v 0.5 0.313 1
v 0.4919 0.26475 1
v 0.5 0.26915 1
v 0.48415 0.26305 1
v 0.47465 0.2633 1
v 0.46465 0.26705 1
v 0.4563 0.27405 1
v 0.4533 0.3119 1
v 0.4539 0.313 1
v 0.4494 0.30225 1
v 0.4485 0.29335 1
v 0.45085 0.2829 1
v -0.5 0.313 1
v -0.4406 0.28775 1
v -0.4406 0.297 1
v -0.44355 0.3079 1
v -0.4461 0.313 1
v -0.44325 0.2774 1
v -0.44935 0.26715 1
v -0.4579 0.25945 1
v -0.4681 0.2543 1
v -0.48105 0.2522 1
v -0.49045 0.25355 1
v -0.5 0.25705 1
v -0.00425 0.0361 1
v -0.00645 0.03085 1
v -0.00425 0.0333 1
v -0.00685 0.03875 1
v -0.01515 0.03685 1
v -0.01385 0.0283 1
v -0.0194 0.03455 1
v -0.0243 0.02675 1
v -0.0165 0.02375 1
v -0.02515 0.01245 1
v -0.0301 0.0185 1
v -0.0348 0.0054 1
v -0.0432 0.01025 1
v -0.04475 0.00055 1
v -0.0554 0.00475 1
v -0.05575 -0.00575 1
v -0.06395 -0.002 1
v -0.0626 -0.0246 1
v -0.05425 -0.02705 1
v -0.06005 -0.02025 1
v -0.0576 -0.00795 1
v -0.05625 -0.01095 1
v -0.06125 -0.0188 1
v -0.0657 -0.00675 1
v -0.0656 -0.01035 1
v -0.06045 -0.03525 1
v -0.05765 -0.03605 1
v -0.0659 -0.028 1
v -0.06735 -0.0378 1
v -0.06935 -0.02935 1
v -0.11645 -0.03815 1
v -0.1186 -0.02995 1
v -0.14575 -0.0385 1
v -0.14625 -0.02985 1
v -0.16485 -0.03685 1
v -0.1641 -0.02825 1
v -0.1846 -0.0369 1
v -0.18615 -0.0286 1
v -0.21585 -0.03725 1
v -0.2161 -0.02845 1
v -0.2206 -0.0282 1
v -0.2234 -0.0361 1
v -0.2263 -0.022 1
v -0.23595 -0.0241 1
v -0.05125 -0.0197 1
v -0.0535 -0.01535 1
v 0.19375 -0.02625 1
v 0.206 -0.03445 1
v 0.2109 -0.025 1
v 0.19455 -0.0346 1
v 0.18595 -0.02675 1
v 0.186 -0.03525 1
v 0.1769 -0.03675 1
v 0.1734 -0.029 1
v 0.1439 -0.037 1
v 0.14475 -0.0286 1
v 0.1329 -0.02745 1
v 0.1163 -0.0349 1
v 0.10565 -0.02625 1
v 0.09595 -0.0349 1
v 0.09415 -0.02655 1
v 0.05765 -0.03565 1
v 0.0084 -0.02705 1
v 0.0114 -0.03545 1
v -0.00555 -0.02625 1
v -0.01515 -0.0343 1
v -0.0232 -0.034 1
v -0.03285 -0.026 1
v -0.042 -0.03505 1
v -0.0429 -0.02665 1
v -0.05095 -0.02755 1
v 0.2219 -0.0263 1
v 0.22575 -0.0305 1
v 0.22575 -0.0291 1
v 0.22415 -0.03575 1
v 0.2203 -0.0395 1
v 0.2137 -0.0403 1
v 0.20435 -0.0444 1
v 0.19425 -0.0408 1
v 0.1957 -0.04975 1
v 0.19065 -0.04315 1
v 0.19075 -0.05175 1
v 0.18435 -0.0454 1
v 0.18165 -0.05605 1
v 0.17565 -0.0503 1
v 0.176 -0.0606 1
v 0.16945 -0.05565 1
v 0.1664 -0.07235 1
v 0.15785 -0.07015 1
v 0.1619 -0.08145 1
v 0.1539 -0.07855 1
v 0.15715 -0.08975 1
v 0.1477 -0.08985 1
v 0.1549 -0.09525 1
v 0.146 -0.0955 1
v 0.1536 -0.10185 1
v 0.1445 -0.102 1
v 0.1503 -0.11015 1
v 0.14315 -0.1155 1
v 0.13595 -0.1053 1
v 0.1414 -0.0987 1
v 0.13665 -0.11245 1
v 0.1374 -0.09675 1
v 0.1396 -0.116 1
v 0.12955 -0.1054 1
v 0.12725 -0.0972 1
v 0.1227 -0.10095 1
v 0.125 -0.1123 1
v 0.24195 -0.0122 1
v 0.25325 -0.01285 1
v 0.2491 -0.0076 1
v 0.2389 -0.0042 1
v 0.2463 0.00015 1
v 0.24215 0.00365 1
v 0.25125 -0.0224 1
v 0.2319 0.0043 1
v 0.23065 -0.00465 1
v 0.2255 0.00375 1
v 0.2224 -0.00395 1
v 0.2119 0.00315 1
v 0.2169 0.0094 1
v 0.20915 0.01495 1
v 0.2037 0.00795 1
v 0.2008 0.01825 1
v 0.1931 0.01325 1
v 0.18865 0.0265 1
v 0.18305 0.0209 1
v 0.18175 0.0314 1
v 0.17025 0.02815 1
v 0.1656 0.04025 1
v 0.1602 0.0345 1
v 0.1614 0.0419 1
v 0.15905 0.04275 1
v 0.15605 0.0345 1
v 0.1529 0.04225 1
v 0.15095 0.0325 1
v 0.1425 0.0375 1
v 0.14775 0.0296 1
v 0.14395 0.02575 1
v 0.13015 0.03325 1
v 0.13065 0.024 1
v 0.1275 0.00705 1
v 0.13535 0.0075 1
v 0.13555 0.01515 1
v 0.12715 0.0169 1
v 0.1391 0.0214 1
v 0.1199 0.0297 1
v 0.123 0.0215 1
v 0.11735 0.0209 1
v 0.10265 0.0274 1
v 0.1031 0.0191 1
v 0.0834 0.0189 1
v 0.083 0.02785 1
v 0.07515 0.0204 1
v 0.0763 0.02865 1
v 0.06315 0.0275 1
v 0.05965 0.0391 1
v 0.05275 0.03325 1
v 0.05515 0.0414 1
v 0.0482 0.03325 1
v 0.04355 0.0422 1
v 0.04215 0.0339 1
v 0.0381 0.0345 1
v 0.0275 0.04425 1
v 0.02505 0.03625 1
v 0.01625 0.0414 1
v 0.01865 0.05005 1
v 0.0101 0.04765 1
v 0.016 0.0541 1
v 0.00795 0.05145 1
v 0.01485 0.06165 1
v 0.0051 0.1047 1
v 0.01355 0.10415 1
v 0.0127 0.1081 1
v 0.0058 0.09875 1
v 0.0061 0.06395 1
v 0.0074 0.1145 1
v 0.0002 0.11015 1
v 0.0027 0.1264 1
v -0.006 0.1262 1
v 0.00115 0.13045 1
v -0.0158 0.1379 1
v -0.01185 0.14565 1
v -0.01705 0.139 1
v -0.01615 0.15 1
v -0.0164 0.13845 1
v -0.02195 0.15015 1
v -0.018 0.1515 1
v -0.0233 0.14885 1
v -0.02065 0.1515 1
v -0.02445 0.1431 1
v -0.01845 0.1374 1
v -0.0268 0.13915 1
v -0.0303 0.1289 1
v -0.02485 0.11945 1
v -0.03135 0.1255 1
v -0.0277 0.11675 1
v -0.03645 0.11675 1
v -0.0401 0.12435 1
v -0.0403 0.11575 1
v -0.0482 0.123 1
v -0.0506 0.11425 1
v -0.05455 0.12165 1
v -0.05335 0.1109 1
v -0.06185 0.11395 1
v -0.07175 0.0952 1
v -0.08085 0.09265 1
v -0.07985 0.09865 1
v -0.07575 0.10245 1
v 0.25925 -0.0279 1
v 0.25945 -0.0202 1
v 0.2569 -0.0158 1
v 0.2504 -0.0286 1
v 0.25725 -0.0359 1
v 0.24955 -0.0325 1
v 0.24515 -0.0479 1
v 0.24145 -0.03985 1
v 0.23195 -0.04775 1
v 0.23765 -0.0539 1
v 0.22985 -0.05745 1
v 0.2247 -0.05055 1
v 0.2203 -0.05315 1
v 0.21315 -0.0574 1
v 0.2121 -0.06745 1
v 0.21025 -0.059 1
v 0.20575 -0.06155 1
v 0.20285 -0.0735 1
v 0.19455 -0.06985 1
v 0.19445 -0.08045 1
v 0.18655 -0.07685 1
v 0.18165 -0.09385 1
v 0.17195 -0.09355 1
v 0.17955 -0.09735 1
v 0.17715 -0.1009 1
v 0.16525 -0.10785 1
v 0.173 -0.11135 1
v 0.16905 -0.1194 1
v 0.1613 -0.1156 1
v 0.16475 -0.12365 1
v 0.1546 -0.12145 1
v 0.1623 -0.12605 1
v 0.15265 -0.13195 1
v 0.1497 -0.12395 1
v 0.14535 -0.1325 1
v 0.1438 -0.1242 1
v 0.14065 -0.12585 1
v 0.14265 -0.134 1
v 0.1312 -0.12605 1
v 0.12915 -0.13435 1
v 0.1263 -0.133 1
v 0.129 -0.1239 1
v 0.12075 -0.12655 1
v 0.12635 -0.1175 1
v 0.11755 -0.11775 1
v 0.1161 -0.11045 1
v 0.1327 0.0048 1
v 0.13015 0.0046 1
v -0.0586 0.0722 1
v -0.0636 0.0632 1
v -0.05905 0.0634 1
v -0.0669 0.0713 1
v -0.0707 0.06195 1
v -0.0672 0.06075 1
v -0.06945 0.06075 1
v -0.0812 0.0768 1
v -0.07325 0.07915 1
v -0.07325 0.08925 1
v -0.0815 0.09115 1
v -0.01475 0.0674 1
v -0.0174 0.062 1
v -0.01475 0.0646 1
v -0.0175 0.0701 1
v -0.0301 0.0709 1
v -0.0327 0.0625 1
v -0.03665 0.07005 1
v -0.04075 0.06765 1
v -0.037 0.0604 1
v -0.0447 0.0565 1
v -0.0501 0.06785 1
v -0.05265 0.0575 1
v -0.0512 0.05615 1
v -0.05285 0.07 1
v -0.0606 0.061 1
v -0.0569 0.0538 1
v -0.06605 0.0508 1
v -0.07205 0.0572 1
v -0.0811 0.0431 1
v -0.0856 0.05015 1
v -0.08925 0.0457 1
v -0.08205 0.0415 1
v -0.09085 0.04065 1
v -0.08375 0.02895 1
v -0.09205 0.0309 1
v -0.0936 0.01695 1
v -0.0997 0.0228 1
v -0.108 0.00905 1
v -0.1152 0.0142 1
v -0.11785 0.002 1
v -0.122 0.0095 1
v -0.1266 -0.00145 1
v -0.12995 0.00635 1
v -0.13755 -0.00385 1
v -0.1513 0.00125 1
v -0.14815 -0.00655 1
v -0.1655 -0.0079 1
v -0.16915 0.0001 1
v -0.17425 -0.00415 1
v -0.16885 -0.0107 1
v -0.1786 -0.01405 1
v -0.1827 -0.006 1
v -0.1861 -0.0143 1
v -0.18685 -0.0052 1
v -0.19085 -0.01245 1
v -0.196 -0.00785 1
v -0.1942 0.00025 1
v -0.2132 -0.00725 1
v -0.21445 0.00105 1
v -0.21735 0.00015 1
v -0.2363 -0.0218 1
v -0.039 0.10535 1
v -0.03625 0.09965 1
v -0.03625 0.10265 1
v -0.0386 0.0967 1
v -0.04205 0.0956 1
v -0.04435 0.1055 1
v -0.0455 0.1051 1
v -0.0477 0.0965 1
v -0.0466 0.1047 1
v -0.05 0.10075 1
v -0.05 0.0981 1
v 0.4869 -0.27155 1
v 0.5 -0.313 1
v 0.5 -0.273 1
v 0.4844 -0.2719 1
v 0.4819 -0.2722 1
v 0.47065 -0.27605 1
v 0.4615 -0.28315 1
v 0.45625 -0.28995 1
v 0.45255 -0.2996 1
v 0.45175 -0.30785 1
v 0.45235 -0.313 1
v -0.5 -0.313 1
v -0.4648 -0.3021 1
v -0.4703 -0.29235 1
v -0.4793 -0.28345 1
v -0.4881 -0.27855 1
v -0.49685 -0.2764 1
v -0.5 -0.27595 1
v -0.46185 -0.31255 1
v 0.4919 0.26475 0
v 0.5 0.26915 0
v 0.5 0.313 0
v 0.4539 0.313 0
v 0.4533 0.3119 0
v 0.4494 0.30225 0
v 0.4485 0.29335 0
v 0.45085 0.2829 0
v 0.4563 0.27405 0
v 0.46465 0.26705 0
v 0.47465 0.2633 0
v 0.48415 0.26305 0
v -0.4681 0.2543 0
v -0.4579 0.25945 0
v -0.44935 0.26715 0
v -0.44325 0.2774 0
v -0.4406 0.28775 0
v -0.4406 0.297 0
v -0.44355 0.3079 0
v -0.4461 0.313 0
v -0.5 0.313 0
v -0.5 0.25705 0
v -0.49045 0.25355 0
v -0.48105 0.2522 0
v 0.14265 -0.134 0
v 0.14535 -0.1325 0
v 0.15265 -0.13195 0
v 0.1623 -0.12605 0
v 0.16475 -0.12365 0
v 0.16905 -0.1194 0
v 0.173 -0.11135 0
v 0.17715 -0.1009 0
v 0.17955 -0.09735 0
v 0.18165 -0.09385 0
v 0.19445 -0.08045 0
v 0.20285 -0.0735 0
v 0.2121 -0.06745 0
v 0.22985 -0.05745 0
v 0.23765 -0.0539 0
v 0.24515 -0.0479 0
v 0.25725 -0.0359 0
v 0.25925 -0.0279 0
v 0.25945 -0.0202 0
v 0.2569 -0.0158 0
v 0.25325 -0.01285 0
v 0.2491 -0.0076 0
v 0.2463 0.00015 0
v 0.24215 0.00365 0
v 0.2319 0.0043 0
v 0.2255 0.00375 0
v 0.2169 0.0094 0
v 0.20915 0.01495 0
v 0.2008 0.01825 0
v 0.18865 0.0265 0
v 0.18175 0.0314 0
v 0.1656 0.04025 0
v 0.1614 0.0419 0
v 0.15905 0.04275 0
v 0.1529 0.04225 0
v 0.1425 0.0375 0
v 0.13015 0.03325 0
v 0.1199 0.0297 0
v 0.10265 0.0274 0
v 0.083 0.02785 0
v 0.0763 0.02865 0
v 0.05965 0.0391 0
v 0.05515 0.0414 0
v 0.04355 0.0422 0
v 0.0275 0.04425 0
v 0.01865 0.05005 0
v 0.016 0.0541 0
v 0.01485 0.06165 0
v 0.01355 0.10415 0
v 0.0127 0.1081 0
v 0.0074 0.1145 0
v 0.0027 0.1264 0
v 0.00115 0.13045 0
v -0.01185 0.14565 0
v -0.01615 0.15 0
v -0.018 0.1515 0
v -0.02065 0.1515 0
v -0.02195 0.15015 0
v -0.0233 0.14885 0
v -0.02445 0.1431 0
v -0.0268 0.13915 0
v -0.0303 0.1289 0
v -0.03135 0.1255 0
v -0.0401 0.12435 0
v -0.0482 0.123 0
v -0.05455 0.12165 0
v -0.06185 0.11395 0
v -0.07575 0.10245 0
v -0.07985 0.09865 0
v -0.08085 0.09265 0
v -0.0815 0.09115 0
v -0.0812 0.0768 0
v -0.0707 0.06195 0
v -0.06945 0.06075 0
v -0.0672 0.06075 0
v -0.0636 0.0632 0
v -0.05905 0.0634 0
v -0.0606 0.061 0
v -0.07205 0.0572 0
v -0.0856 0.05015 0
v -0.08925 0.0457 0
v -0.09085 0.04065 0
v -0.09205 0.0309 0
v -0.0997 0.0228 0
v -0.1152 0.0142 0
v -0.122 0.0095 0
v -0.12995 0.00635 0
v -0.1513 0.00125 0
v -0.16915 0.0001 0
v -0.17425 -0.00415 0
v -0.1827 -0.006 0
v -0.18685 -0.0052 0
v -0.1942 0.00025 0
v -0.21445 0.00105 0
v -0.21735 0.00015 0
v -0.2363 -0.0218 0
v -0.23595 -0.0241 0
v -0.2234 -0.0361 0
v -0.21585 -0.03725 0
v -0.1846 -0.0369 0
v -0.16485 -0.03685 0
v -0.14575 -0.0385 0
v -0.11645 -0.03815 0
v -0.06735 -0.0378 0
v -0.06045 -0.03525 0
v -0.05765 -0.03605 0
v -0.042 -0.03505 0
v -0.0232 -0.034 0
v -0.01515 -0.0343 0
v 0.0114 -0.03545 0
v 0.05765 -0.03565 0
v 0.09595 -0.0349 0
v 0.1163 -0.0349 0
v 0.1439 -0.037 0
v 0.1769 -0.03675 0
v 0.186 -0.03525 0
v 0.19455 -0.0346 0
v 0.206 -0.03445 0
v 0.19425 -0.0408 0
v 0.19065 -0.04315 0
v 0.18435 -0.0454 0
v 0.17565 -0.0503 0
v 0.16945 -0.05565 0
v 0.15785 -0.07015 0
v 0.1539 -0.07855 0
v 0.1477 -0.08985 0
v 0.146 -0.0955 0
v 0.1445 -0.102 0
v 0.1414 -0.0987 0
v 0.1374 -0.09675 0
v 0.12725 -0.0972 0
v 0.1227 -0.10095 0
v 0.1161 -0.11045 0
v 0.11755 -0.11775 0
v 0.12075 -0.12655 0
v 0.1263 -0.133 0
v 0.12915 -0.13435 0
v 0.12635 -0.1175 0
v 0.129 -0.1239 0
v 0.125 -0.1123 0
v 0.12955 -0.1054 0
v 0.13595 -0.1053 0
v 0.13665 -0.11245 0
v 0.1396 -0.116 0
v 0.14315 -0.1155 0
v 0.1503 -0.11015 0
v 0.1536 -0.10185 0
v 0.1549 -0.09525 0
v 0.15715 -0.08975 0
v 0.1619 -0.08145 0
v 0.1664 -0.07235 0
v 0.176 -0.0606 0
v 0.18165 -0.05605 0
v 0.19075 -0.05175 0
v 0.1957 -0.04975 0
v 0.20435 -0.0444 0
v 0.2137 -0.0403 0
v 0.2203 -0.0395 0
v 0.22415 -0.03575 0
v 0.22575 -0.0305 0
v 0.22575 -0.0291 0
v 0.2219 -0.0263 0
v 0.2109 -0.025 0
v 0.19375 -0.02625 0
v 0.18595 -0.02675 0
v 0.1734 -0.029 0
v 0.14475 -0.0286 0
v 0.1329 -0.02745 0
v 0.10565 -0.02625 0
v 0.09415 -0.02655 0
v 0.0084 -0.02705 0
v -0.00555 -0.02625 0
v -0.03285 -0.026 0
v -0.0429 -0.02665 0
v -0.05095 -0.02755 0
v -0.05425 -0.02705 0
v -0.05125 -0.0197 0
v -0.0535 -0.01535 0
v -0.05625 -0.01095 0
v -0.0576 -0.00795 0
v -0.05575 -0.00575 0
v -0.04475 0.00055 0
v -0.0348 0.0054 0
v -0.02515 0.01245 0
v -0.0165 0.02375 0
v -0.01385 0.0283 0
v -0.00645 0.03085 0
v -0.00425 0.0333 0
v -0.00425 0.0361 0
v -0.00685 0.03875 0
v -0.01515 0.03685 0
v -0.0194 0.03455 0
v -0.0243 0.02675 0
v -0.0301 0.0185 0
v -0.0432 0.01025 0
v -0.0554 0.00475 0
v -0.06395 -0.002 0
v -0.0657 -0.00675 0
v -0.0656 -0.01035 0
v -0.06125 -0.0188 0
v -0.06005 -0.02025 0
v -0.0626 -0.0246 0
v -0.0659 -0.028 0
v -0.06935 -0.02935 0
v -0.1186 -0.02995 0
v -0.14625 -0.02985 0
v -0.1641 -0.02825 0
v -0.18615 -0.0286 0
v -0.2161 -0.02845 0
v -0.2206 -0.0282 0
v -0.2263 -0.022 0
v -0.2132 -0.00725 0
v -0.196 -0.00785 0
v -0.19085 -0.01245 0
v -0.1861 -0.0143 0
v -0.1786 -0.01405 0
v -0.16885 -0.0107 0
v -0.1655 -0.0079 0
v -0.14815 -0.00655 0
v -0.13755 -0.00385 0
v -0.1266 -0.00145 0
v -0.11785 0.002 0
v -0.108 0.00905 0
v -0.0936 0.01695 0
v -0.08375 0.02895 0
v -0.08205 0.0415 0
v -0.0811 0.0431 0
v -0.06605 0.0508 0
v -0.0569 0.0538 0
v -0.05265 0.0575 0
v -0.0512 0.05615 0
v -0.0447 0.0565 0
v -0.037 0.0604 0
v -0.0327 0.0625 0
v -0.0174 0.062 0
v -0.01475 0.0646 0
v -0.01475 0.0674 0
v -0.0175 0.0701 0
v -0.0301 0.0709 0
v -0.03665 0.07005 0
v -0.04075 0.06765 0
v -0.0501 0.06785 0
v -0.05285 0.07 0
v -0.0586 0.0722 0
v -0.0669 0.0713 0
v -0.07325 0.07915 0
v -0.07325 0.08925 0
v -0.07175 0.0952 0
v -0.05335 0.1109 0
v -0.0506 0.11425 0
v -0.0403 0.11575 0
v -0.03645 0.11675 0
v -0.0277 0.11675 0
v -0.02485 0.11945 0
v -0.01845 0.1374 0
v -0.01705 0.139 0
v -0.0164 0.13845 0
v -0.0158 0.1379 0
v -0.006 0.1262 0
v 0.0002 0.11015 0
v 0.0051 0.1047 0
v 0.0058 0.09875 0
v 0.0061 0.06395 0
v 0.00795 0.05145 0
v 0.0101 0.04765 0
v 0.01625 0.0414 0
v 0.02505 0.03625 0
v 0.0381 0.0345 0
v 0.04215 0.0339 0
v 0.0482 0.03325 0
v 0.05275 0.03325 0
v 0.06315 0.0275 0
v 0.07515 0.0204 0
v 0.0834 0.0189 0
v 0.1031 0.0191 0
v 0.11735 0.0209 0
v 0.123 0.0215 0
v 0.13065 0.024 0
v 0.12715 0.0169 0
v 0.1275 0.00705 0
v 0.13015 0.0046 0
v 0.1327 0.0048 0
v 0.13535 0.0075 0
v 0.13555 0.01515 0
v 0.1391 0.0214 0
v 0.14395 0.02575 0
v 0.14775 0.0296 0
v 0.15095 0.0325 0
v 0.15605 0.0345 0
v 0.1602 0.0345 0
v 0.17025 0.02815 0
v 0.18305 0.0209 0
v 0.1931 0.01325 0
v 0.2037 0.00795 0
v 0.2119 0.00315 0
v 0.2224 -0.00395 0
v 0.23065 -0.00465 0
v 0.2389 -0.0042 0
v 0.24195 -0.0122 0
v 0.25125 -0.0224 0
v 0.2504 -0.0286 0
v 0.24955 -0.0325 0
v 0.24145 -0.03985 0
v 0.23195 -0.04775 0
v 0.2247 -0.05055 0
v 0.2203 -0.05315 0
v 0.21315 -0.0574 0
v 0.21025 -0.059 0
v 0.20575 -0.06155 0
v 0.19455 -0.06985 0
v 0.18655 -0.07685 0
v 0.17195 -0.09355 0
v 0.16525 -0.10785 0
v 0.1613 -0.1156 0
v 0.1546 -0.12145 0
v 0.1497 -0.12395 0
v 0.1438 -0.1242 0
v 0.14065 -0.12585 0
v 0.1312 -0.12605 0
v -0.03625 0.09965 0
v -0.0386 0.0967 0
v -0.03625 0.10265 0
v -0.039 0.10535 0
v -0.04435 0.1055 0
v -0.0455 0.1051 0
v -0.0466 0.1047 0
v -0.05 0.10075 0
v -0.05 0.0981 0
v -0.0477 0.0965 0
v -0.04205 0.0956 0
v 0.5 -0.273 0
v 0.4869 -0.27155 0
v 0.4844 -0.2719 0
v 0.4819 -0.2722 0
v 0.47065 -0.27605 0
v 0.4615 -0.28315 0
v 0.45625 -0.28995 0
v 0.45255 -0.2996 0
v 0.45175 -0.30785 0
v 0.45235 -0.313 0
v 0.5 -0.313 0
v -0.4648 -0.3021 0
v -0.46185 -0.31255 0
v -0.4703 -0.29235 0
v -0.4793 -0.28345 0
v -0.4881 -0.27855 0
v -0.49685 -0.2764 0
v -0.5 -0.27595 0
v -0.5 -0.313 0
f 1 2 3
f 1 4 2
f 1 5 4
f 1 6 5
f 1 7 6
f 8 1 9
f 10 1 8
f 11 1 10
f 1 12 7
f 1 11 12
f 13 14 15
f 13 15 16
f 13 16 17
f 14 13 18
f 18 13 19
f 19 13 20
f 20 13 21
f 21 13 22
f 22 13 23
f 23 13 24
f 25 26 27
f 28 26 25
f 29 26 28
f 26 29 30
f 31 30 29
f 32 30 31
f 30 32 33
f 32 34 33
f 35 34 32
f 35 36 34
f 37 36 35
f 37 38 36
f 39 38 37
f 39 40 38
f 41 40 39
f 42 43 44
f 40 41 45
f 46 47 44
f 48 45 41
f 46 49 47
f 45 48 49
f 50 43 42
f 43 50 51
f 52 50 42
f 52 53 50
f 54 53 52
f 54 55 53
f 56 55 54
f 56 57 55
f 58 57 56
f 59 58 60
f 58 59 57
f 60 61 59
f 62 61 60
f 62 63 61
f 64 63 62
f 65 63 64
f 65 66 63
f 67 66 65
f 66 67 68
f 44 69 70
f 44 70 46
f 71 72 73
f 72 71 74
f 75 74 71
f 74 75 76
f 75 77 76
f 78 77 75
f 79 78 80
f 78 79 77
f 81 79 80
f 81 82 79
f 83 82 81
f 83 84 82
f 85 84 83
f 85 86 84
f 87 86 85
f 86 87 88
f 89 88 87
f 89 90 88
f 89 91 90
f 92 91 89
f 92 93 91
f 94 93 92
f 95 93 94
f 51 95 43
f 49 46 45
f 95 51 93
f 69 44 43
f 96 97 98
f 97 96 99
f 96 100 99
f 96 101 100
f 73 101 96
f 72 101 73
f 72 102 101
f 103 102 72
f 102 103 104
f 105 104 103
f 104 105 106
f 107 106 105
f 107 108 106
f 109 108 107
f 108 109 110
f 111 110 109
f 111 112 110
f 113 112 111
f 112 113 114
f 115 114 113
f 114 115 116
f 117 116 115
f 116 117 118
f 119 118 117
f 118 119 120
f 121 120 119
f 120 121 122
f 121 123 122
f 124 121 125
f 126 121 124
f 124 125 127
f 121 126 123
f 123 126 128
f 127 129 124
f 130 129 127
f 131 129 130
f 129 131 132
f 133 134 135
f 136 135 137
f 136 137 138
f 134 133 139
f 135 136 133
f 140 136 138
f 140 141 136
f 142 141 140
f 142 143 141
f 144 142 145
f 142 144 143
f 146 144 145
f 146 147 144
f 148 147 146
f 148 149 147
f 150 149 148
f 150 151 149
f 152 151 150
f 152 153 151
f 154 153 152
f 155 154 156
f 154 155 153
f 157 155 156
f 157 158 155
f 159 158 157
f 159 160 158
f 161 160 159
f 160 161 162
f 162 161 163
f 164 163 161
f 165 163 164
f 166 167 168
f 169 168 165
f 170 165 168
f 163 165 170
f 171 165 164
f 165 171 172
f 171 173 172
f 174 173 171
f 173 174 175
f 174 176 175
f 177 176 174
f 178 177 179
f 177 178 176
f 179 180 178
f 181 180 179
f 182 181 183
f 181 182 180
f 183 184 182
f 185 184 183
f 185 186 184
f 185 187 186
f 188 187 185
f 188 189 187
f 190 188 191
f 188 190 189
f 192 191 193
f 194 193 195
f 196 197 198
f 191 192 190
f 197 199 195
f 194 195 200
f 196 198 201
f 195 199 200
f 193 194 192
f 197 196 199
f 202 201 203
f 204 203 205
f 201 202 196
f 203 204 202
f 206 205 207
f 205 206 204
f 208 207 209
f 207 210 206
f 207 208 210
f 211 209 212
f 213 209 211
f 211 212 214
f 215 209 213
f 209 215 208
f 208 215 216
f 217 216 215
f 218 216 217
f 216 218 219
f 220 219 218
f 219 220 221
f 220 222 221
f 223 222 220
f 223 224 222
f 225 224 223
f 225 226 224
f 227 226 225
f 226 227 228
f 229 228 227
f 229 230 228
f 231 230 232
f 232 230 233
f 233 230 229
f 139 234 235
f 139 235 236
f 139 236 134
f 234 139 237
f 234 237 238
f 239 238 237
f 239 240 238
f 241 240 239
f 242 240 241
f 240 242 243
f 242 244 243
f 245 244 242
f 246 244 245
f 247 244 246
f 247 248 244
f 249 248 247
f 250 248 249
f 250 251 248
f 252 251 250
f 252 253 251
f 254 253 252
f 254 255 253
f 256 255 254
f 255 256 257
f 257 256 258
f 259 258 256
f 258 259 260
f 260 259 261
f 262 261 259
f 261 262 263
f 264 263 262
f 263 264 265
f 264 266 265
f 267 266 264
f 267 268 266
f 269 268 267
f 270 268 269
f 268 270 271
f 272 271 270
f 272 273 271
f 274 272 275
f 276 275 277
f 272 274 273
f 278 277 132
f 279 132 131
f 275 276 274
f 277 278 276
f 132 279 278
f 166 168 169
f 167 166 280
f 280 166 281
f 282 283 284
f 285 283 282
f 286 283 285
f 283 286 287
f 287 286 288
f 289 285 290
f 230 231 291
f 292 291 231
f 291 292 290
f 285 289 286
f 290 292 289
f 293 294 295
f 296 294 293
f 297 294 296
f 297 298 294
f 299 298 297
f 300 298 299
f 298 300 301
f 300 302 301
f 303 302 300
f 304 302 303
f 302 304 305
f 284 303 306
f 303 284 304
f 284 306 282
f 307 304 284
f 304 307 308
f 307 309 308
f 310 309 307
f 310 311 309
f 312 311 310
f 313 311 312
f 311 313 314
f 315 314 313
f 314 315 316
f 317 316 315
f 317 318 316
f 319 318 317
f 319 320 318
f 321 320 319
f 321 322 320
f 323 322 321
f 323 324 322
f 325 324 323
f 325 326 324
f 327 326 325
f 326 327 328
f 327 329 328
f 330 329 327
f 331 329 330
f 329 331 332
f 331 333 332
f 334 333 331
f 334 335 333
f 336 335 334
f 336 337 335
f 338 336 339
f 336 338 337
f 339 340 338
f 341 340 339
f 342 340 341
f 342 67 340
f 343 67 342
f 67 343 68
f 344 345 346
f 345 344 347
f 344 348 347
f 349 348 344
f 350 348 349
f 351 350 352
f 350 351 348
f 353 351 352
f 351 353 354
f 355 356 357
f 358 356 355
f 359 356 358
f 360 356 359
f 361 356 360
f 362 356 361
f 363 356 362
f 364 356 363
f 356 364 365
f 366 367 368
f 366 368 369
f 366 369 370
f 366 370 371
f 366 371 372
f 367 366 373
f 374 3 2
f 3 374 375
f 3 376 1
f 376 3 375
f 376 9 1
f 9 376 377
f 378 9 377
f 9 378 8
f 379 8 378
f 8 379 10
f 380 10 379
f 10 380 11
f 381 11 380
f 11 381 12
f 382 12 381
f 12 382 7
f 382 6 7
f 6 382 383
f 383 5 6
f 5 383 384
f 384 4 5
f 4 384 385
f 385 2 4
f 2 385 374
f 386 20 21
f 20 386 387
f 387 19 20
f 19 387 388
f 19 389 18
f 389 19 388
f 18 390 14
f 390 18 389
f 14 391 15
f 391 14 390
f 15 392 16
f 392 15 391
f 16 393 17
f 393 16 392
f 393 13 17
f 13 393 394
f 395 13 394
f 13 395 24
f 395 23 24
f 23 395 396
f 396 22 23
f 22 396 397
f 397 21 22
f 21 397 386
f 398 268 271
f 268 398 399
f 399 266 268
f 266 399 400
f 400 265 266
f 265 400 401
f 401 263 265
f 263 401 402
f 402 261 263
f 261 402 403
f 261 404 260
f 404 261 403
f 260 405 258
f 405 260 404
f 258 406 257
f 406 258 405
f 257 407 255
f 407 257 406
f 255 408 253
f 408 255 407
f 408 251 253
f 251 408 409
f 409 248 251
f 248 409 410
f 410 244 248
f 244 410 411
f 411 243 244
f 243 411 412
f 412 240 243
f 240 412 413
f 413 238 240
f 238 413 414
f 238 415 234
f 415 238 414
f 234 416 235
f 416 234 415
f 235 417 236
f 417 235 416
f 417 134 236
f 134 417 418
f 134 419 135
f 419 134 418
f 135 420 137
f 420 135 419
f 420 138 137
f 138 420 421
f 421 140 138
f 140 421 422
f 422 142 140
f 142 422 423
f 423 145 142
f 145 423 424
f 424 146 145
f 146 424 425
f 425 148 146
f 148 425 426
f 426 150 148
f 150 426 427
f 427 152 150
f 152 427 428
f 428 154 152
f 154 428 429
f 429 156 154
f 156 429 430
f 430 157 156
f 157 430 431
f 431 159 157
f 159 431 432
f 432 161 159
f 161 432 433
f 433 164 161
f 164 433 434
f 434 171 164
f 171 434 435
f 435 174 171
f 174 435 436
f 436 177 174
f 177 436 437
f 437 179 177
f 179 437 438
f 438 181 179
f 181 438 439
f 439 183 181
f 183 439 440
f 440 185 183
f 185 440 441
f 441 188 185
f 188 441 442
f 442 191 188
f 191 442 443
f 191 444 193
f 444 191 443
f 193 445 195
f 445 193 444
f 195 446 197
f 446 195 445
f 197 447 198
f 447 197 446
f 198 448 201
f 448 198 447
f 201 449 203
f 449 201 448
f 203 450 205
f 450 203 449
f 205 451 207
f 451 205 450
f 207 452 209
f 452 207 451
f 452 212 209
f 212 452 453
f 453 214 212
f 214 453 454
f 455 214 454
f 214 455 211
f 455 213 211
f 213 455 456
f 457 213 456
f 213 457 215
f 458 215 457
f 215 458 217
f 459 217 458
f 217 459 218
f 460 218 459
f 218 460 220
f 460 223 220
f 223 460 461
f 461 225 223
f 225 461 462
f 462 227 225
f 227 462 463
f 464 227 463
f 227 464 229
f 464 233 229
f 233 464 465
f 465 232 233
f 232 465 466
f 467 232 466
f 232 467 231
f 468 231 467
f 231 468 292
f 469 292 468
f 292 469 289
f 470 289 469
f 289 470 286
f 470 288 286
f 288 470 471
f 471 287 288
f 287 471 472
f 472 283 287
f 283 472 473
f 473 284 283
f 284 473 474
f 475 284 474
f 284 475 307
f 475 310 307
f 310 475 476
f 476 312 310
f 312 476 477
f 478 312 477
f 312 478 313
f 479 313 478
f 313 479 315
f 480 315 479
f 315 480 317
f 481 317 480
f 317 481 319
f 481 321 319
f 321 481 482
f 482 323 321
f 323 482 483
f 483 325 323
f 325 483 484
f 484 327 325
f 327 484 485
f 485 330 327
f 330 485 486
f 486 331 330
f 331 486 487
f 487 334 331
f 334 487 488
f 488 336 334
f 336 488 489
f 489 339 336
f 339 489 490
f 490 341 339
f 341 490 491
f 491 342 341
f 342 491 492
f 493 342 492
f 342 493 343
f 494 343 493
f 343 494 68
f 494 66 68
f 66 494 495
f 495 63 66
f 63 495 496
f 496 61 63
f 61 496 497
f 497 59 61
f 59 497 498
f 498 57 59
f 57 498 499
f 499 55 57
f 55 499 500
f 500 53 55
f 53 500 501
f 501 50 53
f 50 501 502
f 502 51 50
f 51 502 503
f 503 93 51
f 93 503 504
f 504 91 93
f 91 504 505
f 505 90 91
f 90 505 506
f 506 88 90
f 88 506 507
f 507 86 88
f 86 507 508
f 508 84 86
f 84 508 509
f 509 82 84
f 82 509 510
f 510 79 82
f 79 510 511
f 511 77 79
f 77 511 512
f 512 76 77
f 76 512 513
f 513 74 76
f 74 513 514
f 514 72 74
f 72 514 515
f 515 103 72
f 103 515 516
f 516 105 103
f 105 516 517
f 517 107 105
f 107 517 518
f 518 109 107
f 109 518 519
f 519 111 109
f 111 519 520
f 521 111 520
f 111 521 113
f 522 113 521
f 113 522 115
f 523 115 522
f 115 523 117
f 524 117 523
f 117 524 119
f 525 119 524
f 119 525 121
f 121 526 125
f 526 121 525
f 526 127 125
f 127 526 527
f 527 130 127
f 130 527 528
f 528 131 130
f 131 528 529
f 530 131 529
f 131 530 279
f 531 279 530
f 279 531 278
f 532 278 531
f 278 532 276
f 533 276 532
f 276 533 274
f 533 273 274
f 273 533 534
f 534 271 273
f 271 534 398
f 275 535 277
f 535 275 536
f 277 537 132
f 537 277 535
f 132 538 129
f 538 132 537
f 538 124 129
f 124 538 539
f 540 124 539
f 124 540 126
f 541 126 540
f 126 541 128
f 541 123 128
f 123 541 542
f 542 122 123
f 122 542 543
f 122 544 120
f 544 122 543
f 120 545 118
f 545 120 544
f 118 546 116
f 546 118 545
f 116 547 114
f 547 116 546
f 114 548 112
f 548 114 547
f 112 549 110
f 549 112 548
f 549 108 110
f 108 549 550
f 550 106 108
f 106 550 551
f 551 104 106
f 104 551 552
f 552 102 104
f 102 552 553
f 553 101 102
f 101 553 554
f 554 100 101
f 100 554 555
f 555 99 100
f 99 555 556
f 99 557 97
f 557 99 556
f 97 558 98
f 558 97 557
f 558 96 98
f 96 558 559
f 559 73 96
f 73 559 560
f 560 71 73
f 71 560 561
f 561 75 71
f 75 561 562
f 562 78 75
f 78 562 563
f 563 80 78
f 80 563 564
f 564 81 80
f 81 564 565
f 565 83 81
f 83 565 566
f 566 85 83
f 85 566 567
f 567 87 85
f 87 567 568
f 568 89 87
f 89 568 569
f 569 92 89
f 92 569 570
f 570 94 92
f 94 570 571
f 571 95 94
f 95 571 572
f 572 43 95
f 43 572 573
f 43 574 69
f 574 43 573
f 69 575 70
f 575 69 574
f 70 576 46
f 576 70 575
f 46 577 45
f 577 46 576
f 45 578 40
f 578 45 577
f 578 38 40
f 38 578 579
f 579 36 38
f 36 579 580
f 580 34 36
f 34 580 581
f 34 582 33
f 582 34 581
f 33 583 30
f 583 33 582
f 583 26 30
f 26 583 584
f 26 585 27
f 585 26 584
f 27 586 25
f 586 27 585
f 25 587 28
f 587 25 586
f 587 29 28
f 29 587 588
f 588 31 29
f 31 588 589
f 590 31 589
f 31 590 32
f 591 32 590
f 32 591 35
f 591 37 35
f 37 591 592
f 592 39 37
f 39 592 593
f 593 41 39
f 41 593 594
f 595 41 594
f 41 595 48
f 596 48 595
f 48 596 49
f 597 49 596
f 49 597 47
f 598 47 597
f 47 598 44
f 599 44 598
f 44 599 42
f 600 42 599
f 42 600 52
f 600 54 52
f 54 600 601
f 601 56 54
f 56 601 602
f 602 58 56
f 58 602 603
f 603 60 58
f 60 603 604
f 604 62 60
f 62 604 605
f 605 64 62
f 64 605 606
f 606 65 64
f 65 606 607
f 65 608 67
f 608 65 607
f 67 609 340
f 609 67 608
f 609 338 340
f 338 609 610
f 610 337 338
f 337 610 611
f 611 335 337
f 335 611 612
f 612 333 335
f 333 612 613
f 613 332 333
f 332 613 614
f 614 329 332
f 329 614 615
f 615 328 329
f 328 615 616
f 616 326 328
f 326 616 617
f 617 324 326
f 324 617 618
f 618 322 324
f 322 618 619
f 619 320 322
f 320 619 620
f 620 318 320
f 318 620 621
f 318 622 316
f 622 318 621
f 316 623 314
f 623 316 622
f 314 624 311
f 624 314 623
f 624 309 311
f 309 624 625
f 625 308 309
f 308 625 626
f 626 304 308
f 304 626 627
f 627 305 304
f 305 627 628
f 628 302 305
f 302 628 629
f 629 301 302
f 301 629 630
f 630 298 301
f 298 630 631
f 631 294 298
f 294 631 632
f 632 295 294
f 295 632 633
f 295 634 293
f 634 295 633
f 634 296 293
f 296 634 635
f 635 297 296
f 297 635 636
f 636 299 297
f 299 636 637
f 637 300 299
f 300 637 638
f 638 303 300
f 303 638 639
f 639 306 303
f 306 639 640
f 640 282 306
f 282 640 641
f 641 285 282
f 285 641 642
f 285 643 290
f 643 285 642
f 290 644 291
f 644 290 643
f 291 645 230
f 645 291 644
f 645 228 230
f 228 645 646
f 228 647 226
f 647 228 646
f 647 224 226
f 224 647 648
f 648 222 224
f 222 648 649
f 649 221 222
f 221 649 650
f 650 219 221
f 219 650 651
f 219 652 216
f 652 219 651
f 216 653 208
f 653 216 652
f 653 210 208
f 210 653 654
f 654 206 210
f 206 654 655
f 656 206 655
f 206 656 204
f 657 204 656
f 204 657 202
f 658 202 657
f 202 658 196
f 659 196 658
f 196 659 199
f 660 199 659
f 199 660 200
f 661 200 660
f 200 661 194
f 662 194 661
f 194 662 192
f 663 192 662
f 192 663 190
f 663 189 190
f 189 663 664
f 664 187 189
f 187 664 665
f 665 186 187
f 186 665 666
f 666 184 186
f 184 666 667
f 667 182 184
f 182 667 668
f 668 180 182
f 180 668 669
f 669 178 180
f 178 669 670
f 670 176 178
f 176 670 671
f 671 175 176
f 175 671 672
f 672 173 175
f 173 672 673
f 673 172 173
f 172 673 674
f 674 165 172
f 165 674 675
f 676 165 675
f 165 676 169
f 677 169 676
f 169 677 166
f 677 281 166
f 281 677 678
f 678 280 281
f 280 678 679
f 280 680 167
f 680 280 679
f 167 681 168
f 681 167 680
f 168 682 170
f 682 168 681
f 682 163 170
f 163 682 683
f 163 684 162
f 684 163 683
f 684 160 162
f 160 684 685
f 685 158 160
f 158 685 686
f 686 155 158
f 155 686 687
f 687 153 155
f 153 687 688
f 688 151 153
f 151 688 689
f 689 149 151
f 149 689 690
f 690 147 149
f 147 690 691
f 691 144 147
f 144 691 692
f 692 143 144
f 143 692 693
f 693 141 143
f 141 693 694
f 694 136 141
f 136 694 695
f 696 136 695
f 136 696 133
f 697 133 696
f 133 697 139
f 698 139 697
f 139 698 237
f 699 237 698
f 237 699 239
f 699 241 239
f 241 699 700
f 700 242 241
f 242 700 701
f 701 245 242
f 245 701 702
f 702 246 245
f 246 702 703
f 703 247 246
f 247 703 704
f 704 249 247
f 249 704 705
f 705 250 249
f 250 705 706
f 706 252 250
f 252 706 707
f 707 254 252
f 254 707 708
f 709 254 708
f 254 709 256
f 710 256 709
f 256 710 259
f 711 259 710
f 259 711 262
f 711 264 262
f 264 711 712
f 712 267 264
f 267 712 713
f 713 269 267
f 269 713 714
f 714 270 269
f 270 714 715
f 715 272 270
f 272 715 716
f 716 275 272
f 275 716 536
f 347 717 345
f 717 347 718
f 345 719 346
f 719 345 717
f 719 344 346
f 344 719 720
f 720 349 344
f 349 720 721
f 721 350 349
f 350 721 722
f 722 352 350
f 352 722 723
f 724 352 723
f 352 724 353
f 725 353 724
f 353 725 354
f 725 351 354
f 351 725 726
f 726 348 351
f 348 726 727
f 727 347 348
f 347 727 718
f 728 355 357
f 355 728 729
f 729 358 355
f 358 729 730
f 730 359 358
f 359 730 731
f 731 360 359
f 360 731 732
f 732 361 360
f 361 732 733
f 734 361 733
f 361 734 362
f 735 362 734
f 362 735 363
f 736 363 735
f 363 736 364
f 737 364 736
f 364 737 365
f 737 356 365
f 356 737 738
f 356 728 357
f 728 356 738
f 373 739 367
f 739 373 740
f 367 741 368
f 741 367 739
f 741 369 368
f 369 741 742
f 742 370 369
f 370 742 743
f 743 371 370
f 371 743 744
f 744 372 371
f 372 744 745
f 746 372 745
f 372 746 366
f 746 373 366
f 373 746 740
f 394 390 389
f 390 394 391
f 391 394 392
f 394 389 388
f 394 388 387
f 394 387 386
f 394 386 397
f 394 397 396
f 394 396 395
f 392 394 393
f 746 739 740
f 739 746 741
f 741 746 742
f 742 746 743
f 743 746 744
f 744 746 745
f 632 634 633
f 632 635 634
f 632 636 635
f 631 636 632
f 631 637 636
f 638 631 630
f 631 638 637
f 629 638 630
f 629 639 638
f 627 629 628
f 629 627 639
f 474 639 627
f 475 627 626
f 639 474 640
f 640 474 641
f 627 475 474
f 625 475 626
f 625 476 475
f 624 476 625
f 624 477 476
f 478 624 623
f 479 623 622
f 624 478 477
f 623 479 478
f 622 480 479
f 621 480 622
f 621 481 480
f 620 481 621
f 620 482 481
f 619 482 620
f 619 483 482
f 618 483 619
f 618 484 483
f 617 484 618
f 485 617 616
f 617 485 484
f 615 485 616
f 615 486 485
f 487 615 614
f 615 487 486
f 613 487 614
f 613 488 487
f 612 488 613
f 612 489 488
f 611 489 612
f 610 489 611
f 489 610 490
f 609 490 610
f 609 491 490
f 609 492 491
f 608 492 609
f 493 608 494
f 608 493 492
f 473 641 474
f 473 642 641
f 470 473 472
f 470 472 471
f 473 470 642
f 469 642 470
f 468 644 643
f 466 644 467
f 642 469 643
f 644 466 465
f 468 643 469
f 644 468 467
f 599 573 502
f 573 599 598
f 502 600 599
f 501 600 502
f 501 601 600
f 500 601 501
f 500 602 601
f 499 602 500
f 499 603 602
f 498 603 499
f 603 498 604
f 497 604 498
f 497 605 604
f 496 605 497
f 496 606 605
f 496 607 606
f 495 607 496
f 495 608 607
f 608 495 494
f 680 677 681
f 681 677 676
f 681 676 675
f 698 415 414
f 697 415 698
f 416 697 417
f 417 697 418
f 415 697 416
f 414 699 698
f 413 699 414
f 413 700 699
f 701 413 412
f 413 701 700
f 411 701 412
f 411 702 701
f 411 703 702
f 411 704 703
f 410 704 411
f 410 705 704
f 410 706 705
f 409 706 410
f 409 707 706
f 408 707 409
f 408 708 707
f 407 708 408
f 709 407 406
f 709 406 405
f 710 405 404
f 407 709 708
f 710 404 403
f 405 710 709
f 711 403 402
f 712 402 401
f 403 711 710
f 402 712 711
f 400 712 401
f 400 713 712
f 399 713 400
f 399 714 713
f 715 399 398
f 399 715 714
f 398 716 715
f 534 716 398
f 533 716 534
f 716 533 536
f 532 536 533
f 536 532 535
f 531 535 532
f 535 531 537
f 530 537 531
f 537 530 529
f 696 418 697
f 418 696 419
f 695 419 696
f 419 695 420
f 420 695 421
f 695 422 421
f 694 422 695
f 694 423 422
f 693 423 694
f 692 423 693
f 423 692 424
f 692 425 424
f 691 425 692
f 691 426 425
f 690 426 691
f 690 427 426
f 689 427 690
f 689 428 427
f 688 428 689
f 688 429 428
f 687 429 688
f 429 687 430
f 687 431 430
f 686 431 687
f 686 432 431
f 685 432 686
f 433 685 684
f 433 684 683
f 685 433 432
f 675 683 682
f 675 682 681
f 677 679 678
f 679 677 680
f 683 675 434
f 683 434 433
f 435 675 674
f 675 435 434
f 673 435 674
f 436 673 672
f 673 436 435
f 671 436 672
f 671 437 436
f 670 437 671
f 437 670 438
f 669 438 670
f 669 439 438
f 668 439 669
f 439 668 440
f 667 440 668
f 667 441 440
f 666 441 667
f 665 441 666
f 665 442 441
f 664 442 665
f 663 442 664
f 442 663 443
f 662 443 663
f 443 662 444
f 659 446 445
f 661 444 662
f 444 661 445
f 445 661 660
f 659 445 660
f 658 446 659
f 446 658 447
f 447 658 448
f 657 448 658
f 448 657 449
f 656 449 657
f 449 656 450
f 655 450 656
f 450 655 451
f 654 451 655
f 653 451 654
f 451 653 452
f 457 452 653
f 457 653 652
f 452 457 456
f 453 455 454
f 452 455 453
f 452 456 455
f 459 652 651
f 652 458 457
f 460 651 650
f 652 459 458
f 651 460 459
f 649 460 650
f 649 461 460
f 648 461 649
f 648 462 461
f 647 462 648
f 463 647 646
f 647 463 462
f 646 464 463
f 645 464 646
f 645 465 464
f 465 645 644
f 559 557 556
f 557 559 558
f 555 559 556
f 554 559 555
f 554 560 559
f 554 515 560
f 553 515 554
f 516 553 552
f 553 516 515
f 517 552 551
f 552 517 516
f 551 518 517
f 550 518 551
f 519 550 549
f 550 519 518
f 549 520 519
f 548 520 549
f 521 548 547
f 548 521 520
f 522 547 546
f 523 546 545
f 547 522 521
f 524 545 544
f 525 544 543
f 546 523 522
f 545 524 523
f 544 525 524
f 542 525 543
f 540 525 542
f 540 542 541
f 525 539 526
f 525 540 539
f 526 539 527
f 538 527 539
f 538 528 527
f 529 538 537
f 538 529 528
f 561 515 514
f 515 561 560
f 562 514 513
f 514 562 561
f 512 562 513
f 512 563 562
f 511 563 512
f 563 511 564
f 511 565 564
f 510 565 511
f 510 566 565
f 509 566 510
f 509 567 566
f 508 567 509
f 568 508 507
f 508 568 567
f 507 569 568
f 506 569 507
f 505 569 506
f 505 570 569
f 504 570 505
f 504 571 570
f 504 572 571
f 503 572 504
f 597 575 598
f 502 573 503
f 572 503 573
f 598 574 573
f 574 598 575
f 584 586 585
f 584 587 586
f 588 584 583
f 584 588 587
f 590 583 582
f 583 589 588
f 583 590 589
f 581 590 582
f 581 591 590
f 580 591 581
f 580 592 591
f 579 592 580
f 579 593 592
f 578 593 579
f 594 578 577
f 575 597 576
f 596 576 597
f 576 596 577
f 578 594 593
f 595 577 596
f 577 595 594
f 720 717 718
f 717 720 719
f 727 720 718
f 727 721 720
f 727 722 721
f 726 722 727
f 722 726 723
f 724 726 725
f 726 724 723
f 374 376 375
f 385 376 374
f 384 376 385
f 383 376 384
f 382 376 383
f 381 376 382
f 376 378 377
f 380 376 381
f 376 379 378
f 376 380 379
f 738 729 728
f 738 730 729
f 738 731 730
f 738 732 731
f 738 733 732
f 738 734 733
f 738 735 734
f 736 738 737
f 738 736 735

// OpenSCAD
module fan7yellow_1()
{
 /* Generated by trace2scad version 20150415
    http://aggregate.org/MAKE/TRACE2SCAD/
    Optimized model has 376/1821 original points
 */
 color([0.5, 0.5, 0.5])
 assign(minx=0) /* polygon minx=0 */
 assign(miny=0) /* polygon miny=0 */
 assign(maxx=20000) /* polygon maxx=20000 */
 assign(maxy=12520) /* polygon maxy=12520 */
 assign(dx=maxx-minx)
 assign(dy=maxy-miny)
 assign(maxd=((dx>dy)?dx:dy))
 scale([1/maxd, 1/maxd, 1])
 translate([-minx-dx/2, -miny-dy/2, 0])
 linear_extrude(height=1, convexity=376)
 union() {
  union() {
   polygon([[0,11961],[0,11401],[191,11331],[379,11304],[638,11346],[842,11449],[1013,11603],[1135,11808],[1188,12015],[1188,12200],[1129,12418],[1078,12520],[0,12520]], convexity=5);
   polygon([[19072,12509],[19066,12498],[18988,12305],[18970,12127],[19017,11918],[19126,11741],[19293,11601],[19493,11526],[19683,11521],[19838,11555],[20000,11643],[20000,12520],[19078,12520]], convexity=6);
   union() {
    difference() {
     polygon([[9561,9263],[9534,9237],[9511,9122],[9464,9043],[9394,8838],[9373,8770],[9198,8747],[9036,8720],[8909,8693],[8763,8539],[8485,8309],[8403,8233],[8383,8113],[8370,8083],[8376,7796],[8586,7499],[8611,7475],[8656,7475],[8728,7524],[8819,7528],[8788,7480],[8559,7404],[8288,7263],[8215,7174],[8183,7073],[8159,6878],[8006,6716],[7696,6544],[7560,6450],[7401,6387],[6974,6285],[6617,6262],[6515,6177],[6346,6140],[6263,6156],[6116,6265],[5711,6281],[5653,6263],[5274,5824],[5281,5778],[5532,5538],[5683,5515],[6308,5522],[6703,5523],[7085,5490],[7671,5497],[8653,5504],[8791,5555],[8847,5539],[9160,5559],[9536,5580],[9697,5574],[10228,5551],[11153,5547],[11919,5562],[12326,5562],[12878,5520],[13538,5525],[13720,5555],[13891,5568],[14120,5571],[13885,5444],[13813,5397],[13687,5352],[13513,5254],[13389,5147],[13157,4857],[13078,4689],[12954,4463],[12920,4350],[12890,4220],[12828,4286],[12748,4325],[12545,4316],[12454,4241],[12322,4051],[12351,3905],[12415,3729],[12526,3600],[12583,3573],[12853,3580],[12907,3610],[13053,3621],[13246,3739],[13295,3787],[13381,3872],[13460,4033],[13543,4242],[13591,4313],[13633,4383],[13889,4651],[14057,4790],[14242,4911],[14597,5111],[14753,5182],[14903,5302],[15145,5542],[15185,5702],[15189,5856],[15138,5944],[15065,6003],[14982,6108],[14926,6263],[14843,6333],[14638,6346],[14510,6335],[14338,6448],[14183,6559],[14016,6625],[13773,6790],[13635,6888],[13312,7065],[13228,7098],[13181,7115],[13058,7105],[12850,7010],[12603,6925],[12398,6854],[12053,6808],[11660,6817],[11526,6833],[11193,7042],[11103,7088],[10871,7104],[10550,7145],[10373,7261],[10320,7342],[10297,7493],[10271,8343],[10254,8422],[10148,8550],[10054,8788],[10023,8869],[9763,9173],[9677,9260],[9640,9290],[9587,9290]], convexity=28);
     polygon([[9672,9029],[9684,9018],[9880,8784],[10004,8463],[10102,8354],[10116,8235],[10122,7539],[10159,7289],[10202,7213],[10325,7088],[10501,6985],[10762,6950],[10843,6938],[10964,6925],[11055,6925],[11263,6810],[11503,6668],[11668,6638],[12062,6642],[12347,6678],[12460,6690],[12613,6740],[12543,6598],[12550,6401],[12603,6352],[12654,6356],[12707,6410],[12711,6563],[12782,6688],[12879,6775],[12955,6852],[13019,6910],[13121,6950],[13204,6950],[13405,6823],[13661,6678],[13862,6525],[14074,6419],[14238,6323],[14448,6181],[14613,6167],[14778,6176],[14839,6016],[15025,5812],[15008,5688],[14991,5610],[14829,5463],[14639,5305],[14494,5249],[14406,5197],[14263,5112],[14205,5080],[14115,5029],[13891,4863],[13731,4723],[13439,4389],[13305,4103],[13226,3948],[13092,3831],[12994,3781],[12876,3776],[12813,3743],[12624,3739],[12580,3782],[12527,3910],[12500,4014],[12591,4152],[12719,4154],[12733,4011],[12792,3940],[12863,3950],[13006,4057],[13072,4223],[13098,4355],[13143,4465],[13238,4631],[13328,4813],[13520,5048],[13633,5139],[13815,5225],[13914,5265],[14087,5372],[14274,5454],[14406,5470],[14483,5545],[14515,5650],[14515,5678],[14438,5734],[14218,5760],[13875,5735],[13719,5725],[13468,5680],[12895,5688],[12658,5711],[12113,5735],[11883,5729],[10168,5719],[9889,5735],[9343,5740],[9142,5727],[8981,5709],[8915,5719],[8975,5866],[8930,5953],[8875,6041],[8848,6101],[8885,6145],[9105,6271],[9304,6368],[9497,6509],[9670,6735],[9723,6826],[9871,6877],[9915,6926],[9915,6982],[9863,7035],[9697,6997],[9612,6951],[9514,6795],[9398,6630],[9136,6465],[8892,6355],[8721,6220],[8686,6125],[8688,6053],[8775,5884],[8799,5855],[8748,5768],[8682,5700],[8613,5673],[7628,5661],[7075,5663],[6718,5695],[6277,5688],[5678,5691],[5588,5696],[5474,5820],[5736,6115],[6080,6103],[6183,6011],[6278,5974],[6428,5979],[6623,6046],[6690,6102],[7037,6129],[7249,6183],[7468,6231],[7643,6300],[7840,6441],[8128,6599],[8325,6839],[8359,7090],[8378,7122],[8679,7276],[8862,7336],[8947,7410],[8976,7383],[9106,7390],[9260,7468],[9346,7510],[9652,7500],[9705,7552],[9705,7608],[9650,7662],[9398,7678],[9267,7661],[9185,7613],[8998,7617],[8943,7660],[8828,7704],[8662,7686],[8535,7843],[8535,8045],[8565,8164],[8933,8478],[8988,8545],[9194,8575],[9271,8595],[9446,8595],[9503,8649],[9631,9008],[9659,9040]], convexity=47);
    }
    polygon([[9090,8362],[9068,8354],[9000,8275],[9000,8222],[9046,8190],[9159,8172],[9228,8194],[9275,8253],[9275,8313],[9220,8367],[9113,8370]], convexity=6);
   }
   polygon([[19688,822],[19638,816],[19413,739],[19230,597],[19125,461],[19051,268],[19035,103],[19047,0],[20000,0],[20000,800],[19738,829]], convexity=6);
   polygon([[0,371],[0,0],[763,9],[704,218],[594,413],[414,591],[238,689],[63,732],[0,741]], convexity=5);
  }
 }
}

module fan7yellow()
{
 /* all layers combined, scaled to within a 1mm cube */
 scale([1, 1, 1/1])
 difference() {
  union() {
   scale([1,1,2]) translate([0,0,-0.5]) fan7yellow_1();
  }
  translate([0,0,-2]) cube([2,2,4],center=true);
 }
}
fan7yellow();
